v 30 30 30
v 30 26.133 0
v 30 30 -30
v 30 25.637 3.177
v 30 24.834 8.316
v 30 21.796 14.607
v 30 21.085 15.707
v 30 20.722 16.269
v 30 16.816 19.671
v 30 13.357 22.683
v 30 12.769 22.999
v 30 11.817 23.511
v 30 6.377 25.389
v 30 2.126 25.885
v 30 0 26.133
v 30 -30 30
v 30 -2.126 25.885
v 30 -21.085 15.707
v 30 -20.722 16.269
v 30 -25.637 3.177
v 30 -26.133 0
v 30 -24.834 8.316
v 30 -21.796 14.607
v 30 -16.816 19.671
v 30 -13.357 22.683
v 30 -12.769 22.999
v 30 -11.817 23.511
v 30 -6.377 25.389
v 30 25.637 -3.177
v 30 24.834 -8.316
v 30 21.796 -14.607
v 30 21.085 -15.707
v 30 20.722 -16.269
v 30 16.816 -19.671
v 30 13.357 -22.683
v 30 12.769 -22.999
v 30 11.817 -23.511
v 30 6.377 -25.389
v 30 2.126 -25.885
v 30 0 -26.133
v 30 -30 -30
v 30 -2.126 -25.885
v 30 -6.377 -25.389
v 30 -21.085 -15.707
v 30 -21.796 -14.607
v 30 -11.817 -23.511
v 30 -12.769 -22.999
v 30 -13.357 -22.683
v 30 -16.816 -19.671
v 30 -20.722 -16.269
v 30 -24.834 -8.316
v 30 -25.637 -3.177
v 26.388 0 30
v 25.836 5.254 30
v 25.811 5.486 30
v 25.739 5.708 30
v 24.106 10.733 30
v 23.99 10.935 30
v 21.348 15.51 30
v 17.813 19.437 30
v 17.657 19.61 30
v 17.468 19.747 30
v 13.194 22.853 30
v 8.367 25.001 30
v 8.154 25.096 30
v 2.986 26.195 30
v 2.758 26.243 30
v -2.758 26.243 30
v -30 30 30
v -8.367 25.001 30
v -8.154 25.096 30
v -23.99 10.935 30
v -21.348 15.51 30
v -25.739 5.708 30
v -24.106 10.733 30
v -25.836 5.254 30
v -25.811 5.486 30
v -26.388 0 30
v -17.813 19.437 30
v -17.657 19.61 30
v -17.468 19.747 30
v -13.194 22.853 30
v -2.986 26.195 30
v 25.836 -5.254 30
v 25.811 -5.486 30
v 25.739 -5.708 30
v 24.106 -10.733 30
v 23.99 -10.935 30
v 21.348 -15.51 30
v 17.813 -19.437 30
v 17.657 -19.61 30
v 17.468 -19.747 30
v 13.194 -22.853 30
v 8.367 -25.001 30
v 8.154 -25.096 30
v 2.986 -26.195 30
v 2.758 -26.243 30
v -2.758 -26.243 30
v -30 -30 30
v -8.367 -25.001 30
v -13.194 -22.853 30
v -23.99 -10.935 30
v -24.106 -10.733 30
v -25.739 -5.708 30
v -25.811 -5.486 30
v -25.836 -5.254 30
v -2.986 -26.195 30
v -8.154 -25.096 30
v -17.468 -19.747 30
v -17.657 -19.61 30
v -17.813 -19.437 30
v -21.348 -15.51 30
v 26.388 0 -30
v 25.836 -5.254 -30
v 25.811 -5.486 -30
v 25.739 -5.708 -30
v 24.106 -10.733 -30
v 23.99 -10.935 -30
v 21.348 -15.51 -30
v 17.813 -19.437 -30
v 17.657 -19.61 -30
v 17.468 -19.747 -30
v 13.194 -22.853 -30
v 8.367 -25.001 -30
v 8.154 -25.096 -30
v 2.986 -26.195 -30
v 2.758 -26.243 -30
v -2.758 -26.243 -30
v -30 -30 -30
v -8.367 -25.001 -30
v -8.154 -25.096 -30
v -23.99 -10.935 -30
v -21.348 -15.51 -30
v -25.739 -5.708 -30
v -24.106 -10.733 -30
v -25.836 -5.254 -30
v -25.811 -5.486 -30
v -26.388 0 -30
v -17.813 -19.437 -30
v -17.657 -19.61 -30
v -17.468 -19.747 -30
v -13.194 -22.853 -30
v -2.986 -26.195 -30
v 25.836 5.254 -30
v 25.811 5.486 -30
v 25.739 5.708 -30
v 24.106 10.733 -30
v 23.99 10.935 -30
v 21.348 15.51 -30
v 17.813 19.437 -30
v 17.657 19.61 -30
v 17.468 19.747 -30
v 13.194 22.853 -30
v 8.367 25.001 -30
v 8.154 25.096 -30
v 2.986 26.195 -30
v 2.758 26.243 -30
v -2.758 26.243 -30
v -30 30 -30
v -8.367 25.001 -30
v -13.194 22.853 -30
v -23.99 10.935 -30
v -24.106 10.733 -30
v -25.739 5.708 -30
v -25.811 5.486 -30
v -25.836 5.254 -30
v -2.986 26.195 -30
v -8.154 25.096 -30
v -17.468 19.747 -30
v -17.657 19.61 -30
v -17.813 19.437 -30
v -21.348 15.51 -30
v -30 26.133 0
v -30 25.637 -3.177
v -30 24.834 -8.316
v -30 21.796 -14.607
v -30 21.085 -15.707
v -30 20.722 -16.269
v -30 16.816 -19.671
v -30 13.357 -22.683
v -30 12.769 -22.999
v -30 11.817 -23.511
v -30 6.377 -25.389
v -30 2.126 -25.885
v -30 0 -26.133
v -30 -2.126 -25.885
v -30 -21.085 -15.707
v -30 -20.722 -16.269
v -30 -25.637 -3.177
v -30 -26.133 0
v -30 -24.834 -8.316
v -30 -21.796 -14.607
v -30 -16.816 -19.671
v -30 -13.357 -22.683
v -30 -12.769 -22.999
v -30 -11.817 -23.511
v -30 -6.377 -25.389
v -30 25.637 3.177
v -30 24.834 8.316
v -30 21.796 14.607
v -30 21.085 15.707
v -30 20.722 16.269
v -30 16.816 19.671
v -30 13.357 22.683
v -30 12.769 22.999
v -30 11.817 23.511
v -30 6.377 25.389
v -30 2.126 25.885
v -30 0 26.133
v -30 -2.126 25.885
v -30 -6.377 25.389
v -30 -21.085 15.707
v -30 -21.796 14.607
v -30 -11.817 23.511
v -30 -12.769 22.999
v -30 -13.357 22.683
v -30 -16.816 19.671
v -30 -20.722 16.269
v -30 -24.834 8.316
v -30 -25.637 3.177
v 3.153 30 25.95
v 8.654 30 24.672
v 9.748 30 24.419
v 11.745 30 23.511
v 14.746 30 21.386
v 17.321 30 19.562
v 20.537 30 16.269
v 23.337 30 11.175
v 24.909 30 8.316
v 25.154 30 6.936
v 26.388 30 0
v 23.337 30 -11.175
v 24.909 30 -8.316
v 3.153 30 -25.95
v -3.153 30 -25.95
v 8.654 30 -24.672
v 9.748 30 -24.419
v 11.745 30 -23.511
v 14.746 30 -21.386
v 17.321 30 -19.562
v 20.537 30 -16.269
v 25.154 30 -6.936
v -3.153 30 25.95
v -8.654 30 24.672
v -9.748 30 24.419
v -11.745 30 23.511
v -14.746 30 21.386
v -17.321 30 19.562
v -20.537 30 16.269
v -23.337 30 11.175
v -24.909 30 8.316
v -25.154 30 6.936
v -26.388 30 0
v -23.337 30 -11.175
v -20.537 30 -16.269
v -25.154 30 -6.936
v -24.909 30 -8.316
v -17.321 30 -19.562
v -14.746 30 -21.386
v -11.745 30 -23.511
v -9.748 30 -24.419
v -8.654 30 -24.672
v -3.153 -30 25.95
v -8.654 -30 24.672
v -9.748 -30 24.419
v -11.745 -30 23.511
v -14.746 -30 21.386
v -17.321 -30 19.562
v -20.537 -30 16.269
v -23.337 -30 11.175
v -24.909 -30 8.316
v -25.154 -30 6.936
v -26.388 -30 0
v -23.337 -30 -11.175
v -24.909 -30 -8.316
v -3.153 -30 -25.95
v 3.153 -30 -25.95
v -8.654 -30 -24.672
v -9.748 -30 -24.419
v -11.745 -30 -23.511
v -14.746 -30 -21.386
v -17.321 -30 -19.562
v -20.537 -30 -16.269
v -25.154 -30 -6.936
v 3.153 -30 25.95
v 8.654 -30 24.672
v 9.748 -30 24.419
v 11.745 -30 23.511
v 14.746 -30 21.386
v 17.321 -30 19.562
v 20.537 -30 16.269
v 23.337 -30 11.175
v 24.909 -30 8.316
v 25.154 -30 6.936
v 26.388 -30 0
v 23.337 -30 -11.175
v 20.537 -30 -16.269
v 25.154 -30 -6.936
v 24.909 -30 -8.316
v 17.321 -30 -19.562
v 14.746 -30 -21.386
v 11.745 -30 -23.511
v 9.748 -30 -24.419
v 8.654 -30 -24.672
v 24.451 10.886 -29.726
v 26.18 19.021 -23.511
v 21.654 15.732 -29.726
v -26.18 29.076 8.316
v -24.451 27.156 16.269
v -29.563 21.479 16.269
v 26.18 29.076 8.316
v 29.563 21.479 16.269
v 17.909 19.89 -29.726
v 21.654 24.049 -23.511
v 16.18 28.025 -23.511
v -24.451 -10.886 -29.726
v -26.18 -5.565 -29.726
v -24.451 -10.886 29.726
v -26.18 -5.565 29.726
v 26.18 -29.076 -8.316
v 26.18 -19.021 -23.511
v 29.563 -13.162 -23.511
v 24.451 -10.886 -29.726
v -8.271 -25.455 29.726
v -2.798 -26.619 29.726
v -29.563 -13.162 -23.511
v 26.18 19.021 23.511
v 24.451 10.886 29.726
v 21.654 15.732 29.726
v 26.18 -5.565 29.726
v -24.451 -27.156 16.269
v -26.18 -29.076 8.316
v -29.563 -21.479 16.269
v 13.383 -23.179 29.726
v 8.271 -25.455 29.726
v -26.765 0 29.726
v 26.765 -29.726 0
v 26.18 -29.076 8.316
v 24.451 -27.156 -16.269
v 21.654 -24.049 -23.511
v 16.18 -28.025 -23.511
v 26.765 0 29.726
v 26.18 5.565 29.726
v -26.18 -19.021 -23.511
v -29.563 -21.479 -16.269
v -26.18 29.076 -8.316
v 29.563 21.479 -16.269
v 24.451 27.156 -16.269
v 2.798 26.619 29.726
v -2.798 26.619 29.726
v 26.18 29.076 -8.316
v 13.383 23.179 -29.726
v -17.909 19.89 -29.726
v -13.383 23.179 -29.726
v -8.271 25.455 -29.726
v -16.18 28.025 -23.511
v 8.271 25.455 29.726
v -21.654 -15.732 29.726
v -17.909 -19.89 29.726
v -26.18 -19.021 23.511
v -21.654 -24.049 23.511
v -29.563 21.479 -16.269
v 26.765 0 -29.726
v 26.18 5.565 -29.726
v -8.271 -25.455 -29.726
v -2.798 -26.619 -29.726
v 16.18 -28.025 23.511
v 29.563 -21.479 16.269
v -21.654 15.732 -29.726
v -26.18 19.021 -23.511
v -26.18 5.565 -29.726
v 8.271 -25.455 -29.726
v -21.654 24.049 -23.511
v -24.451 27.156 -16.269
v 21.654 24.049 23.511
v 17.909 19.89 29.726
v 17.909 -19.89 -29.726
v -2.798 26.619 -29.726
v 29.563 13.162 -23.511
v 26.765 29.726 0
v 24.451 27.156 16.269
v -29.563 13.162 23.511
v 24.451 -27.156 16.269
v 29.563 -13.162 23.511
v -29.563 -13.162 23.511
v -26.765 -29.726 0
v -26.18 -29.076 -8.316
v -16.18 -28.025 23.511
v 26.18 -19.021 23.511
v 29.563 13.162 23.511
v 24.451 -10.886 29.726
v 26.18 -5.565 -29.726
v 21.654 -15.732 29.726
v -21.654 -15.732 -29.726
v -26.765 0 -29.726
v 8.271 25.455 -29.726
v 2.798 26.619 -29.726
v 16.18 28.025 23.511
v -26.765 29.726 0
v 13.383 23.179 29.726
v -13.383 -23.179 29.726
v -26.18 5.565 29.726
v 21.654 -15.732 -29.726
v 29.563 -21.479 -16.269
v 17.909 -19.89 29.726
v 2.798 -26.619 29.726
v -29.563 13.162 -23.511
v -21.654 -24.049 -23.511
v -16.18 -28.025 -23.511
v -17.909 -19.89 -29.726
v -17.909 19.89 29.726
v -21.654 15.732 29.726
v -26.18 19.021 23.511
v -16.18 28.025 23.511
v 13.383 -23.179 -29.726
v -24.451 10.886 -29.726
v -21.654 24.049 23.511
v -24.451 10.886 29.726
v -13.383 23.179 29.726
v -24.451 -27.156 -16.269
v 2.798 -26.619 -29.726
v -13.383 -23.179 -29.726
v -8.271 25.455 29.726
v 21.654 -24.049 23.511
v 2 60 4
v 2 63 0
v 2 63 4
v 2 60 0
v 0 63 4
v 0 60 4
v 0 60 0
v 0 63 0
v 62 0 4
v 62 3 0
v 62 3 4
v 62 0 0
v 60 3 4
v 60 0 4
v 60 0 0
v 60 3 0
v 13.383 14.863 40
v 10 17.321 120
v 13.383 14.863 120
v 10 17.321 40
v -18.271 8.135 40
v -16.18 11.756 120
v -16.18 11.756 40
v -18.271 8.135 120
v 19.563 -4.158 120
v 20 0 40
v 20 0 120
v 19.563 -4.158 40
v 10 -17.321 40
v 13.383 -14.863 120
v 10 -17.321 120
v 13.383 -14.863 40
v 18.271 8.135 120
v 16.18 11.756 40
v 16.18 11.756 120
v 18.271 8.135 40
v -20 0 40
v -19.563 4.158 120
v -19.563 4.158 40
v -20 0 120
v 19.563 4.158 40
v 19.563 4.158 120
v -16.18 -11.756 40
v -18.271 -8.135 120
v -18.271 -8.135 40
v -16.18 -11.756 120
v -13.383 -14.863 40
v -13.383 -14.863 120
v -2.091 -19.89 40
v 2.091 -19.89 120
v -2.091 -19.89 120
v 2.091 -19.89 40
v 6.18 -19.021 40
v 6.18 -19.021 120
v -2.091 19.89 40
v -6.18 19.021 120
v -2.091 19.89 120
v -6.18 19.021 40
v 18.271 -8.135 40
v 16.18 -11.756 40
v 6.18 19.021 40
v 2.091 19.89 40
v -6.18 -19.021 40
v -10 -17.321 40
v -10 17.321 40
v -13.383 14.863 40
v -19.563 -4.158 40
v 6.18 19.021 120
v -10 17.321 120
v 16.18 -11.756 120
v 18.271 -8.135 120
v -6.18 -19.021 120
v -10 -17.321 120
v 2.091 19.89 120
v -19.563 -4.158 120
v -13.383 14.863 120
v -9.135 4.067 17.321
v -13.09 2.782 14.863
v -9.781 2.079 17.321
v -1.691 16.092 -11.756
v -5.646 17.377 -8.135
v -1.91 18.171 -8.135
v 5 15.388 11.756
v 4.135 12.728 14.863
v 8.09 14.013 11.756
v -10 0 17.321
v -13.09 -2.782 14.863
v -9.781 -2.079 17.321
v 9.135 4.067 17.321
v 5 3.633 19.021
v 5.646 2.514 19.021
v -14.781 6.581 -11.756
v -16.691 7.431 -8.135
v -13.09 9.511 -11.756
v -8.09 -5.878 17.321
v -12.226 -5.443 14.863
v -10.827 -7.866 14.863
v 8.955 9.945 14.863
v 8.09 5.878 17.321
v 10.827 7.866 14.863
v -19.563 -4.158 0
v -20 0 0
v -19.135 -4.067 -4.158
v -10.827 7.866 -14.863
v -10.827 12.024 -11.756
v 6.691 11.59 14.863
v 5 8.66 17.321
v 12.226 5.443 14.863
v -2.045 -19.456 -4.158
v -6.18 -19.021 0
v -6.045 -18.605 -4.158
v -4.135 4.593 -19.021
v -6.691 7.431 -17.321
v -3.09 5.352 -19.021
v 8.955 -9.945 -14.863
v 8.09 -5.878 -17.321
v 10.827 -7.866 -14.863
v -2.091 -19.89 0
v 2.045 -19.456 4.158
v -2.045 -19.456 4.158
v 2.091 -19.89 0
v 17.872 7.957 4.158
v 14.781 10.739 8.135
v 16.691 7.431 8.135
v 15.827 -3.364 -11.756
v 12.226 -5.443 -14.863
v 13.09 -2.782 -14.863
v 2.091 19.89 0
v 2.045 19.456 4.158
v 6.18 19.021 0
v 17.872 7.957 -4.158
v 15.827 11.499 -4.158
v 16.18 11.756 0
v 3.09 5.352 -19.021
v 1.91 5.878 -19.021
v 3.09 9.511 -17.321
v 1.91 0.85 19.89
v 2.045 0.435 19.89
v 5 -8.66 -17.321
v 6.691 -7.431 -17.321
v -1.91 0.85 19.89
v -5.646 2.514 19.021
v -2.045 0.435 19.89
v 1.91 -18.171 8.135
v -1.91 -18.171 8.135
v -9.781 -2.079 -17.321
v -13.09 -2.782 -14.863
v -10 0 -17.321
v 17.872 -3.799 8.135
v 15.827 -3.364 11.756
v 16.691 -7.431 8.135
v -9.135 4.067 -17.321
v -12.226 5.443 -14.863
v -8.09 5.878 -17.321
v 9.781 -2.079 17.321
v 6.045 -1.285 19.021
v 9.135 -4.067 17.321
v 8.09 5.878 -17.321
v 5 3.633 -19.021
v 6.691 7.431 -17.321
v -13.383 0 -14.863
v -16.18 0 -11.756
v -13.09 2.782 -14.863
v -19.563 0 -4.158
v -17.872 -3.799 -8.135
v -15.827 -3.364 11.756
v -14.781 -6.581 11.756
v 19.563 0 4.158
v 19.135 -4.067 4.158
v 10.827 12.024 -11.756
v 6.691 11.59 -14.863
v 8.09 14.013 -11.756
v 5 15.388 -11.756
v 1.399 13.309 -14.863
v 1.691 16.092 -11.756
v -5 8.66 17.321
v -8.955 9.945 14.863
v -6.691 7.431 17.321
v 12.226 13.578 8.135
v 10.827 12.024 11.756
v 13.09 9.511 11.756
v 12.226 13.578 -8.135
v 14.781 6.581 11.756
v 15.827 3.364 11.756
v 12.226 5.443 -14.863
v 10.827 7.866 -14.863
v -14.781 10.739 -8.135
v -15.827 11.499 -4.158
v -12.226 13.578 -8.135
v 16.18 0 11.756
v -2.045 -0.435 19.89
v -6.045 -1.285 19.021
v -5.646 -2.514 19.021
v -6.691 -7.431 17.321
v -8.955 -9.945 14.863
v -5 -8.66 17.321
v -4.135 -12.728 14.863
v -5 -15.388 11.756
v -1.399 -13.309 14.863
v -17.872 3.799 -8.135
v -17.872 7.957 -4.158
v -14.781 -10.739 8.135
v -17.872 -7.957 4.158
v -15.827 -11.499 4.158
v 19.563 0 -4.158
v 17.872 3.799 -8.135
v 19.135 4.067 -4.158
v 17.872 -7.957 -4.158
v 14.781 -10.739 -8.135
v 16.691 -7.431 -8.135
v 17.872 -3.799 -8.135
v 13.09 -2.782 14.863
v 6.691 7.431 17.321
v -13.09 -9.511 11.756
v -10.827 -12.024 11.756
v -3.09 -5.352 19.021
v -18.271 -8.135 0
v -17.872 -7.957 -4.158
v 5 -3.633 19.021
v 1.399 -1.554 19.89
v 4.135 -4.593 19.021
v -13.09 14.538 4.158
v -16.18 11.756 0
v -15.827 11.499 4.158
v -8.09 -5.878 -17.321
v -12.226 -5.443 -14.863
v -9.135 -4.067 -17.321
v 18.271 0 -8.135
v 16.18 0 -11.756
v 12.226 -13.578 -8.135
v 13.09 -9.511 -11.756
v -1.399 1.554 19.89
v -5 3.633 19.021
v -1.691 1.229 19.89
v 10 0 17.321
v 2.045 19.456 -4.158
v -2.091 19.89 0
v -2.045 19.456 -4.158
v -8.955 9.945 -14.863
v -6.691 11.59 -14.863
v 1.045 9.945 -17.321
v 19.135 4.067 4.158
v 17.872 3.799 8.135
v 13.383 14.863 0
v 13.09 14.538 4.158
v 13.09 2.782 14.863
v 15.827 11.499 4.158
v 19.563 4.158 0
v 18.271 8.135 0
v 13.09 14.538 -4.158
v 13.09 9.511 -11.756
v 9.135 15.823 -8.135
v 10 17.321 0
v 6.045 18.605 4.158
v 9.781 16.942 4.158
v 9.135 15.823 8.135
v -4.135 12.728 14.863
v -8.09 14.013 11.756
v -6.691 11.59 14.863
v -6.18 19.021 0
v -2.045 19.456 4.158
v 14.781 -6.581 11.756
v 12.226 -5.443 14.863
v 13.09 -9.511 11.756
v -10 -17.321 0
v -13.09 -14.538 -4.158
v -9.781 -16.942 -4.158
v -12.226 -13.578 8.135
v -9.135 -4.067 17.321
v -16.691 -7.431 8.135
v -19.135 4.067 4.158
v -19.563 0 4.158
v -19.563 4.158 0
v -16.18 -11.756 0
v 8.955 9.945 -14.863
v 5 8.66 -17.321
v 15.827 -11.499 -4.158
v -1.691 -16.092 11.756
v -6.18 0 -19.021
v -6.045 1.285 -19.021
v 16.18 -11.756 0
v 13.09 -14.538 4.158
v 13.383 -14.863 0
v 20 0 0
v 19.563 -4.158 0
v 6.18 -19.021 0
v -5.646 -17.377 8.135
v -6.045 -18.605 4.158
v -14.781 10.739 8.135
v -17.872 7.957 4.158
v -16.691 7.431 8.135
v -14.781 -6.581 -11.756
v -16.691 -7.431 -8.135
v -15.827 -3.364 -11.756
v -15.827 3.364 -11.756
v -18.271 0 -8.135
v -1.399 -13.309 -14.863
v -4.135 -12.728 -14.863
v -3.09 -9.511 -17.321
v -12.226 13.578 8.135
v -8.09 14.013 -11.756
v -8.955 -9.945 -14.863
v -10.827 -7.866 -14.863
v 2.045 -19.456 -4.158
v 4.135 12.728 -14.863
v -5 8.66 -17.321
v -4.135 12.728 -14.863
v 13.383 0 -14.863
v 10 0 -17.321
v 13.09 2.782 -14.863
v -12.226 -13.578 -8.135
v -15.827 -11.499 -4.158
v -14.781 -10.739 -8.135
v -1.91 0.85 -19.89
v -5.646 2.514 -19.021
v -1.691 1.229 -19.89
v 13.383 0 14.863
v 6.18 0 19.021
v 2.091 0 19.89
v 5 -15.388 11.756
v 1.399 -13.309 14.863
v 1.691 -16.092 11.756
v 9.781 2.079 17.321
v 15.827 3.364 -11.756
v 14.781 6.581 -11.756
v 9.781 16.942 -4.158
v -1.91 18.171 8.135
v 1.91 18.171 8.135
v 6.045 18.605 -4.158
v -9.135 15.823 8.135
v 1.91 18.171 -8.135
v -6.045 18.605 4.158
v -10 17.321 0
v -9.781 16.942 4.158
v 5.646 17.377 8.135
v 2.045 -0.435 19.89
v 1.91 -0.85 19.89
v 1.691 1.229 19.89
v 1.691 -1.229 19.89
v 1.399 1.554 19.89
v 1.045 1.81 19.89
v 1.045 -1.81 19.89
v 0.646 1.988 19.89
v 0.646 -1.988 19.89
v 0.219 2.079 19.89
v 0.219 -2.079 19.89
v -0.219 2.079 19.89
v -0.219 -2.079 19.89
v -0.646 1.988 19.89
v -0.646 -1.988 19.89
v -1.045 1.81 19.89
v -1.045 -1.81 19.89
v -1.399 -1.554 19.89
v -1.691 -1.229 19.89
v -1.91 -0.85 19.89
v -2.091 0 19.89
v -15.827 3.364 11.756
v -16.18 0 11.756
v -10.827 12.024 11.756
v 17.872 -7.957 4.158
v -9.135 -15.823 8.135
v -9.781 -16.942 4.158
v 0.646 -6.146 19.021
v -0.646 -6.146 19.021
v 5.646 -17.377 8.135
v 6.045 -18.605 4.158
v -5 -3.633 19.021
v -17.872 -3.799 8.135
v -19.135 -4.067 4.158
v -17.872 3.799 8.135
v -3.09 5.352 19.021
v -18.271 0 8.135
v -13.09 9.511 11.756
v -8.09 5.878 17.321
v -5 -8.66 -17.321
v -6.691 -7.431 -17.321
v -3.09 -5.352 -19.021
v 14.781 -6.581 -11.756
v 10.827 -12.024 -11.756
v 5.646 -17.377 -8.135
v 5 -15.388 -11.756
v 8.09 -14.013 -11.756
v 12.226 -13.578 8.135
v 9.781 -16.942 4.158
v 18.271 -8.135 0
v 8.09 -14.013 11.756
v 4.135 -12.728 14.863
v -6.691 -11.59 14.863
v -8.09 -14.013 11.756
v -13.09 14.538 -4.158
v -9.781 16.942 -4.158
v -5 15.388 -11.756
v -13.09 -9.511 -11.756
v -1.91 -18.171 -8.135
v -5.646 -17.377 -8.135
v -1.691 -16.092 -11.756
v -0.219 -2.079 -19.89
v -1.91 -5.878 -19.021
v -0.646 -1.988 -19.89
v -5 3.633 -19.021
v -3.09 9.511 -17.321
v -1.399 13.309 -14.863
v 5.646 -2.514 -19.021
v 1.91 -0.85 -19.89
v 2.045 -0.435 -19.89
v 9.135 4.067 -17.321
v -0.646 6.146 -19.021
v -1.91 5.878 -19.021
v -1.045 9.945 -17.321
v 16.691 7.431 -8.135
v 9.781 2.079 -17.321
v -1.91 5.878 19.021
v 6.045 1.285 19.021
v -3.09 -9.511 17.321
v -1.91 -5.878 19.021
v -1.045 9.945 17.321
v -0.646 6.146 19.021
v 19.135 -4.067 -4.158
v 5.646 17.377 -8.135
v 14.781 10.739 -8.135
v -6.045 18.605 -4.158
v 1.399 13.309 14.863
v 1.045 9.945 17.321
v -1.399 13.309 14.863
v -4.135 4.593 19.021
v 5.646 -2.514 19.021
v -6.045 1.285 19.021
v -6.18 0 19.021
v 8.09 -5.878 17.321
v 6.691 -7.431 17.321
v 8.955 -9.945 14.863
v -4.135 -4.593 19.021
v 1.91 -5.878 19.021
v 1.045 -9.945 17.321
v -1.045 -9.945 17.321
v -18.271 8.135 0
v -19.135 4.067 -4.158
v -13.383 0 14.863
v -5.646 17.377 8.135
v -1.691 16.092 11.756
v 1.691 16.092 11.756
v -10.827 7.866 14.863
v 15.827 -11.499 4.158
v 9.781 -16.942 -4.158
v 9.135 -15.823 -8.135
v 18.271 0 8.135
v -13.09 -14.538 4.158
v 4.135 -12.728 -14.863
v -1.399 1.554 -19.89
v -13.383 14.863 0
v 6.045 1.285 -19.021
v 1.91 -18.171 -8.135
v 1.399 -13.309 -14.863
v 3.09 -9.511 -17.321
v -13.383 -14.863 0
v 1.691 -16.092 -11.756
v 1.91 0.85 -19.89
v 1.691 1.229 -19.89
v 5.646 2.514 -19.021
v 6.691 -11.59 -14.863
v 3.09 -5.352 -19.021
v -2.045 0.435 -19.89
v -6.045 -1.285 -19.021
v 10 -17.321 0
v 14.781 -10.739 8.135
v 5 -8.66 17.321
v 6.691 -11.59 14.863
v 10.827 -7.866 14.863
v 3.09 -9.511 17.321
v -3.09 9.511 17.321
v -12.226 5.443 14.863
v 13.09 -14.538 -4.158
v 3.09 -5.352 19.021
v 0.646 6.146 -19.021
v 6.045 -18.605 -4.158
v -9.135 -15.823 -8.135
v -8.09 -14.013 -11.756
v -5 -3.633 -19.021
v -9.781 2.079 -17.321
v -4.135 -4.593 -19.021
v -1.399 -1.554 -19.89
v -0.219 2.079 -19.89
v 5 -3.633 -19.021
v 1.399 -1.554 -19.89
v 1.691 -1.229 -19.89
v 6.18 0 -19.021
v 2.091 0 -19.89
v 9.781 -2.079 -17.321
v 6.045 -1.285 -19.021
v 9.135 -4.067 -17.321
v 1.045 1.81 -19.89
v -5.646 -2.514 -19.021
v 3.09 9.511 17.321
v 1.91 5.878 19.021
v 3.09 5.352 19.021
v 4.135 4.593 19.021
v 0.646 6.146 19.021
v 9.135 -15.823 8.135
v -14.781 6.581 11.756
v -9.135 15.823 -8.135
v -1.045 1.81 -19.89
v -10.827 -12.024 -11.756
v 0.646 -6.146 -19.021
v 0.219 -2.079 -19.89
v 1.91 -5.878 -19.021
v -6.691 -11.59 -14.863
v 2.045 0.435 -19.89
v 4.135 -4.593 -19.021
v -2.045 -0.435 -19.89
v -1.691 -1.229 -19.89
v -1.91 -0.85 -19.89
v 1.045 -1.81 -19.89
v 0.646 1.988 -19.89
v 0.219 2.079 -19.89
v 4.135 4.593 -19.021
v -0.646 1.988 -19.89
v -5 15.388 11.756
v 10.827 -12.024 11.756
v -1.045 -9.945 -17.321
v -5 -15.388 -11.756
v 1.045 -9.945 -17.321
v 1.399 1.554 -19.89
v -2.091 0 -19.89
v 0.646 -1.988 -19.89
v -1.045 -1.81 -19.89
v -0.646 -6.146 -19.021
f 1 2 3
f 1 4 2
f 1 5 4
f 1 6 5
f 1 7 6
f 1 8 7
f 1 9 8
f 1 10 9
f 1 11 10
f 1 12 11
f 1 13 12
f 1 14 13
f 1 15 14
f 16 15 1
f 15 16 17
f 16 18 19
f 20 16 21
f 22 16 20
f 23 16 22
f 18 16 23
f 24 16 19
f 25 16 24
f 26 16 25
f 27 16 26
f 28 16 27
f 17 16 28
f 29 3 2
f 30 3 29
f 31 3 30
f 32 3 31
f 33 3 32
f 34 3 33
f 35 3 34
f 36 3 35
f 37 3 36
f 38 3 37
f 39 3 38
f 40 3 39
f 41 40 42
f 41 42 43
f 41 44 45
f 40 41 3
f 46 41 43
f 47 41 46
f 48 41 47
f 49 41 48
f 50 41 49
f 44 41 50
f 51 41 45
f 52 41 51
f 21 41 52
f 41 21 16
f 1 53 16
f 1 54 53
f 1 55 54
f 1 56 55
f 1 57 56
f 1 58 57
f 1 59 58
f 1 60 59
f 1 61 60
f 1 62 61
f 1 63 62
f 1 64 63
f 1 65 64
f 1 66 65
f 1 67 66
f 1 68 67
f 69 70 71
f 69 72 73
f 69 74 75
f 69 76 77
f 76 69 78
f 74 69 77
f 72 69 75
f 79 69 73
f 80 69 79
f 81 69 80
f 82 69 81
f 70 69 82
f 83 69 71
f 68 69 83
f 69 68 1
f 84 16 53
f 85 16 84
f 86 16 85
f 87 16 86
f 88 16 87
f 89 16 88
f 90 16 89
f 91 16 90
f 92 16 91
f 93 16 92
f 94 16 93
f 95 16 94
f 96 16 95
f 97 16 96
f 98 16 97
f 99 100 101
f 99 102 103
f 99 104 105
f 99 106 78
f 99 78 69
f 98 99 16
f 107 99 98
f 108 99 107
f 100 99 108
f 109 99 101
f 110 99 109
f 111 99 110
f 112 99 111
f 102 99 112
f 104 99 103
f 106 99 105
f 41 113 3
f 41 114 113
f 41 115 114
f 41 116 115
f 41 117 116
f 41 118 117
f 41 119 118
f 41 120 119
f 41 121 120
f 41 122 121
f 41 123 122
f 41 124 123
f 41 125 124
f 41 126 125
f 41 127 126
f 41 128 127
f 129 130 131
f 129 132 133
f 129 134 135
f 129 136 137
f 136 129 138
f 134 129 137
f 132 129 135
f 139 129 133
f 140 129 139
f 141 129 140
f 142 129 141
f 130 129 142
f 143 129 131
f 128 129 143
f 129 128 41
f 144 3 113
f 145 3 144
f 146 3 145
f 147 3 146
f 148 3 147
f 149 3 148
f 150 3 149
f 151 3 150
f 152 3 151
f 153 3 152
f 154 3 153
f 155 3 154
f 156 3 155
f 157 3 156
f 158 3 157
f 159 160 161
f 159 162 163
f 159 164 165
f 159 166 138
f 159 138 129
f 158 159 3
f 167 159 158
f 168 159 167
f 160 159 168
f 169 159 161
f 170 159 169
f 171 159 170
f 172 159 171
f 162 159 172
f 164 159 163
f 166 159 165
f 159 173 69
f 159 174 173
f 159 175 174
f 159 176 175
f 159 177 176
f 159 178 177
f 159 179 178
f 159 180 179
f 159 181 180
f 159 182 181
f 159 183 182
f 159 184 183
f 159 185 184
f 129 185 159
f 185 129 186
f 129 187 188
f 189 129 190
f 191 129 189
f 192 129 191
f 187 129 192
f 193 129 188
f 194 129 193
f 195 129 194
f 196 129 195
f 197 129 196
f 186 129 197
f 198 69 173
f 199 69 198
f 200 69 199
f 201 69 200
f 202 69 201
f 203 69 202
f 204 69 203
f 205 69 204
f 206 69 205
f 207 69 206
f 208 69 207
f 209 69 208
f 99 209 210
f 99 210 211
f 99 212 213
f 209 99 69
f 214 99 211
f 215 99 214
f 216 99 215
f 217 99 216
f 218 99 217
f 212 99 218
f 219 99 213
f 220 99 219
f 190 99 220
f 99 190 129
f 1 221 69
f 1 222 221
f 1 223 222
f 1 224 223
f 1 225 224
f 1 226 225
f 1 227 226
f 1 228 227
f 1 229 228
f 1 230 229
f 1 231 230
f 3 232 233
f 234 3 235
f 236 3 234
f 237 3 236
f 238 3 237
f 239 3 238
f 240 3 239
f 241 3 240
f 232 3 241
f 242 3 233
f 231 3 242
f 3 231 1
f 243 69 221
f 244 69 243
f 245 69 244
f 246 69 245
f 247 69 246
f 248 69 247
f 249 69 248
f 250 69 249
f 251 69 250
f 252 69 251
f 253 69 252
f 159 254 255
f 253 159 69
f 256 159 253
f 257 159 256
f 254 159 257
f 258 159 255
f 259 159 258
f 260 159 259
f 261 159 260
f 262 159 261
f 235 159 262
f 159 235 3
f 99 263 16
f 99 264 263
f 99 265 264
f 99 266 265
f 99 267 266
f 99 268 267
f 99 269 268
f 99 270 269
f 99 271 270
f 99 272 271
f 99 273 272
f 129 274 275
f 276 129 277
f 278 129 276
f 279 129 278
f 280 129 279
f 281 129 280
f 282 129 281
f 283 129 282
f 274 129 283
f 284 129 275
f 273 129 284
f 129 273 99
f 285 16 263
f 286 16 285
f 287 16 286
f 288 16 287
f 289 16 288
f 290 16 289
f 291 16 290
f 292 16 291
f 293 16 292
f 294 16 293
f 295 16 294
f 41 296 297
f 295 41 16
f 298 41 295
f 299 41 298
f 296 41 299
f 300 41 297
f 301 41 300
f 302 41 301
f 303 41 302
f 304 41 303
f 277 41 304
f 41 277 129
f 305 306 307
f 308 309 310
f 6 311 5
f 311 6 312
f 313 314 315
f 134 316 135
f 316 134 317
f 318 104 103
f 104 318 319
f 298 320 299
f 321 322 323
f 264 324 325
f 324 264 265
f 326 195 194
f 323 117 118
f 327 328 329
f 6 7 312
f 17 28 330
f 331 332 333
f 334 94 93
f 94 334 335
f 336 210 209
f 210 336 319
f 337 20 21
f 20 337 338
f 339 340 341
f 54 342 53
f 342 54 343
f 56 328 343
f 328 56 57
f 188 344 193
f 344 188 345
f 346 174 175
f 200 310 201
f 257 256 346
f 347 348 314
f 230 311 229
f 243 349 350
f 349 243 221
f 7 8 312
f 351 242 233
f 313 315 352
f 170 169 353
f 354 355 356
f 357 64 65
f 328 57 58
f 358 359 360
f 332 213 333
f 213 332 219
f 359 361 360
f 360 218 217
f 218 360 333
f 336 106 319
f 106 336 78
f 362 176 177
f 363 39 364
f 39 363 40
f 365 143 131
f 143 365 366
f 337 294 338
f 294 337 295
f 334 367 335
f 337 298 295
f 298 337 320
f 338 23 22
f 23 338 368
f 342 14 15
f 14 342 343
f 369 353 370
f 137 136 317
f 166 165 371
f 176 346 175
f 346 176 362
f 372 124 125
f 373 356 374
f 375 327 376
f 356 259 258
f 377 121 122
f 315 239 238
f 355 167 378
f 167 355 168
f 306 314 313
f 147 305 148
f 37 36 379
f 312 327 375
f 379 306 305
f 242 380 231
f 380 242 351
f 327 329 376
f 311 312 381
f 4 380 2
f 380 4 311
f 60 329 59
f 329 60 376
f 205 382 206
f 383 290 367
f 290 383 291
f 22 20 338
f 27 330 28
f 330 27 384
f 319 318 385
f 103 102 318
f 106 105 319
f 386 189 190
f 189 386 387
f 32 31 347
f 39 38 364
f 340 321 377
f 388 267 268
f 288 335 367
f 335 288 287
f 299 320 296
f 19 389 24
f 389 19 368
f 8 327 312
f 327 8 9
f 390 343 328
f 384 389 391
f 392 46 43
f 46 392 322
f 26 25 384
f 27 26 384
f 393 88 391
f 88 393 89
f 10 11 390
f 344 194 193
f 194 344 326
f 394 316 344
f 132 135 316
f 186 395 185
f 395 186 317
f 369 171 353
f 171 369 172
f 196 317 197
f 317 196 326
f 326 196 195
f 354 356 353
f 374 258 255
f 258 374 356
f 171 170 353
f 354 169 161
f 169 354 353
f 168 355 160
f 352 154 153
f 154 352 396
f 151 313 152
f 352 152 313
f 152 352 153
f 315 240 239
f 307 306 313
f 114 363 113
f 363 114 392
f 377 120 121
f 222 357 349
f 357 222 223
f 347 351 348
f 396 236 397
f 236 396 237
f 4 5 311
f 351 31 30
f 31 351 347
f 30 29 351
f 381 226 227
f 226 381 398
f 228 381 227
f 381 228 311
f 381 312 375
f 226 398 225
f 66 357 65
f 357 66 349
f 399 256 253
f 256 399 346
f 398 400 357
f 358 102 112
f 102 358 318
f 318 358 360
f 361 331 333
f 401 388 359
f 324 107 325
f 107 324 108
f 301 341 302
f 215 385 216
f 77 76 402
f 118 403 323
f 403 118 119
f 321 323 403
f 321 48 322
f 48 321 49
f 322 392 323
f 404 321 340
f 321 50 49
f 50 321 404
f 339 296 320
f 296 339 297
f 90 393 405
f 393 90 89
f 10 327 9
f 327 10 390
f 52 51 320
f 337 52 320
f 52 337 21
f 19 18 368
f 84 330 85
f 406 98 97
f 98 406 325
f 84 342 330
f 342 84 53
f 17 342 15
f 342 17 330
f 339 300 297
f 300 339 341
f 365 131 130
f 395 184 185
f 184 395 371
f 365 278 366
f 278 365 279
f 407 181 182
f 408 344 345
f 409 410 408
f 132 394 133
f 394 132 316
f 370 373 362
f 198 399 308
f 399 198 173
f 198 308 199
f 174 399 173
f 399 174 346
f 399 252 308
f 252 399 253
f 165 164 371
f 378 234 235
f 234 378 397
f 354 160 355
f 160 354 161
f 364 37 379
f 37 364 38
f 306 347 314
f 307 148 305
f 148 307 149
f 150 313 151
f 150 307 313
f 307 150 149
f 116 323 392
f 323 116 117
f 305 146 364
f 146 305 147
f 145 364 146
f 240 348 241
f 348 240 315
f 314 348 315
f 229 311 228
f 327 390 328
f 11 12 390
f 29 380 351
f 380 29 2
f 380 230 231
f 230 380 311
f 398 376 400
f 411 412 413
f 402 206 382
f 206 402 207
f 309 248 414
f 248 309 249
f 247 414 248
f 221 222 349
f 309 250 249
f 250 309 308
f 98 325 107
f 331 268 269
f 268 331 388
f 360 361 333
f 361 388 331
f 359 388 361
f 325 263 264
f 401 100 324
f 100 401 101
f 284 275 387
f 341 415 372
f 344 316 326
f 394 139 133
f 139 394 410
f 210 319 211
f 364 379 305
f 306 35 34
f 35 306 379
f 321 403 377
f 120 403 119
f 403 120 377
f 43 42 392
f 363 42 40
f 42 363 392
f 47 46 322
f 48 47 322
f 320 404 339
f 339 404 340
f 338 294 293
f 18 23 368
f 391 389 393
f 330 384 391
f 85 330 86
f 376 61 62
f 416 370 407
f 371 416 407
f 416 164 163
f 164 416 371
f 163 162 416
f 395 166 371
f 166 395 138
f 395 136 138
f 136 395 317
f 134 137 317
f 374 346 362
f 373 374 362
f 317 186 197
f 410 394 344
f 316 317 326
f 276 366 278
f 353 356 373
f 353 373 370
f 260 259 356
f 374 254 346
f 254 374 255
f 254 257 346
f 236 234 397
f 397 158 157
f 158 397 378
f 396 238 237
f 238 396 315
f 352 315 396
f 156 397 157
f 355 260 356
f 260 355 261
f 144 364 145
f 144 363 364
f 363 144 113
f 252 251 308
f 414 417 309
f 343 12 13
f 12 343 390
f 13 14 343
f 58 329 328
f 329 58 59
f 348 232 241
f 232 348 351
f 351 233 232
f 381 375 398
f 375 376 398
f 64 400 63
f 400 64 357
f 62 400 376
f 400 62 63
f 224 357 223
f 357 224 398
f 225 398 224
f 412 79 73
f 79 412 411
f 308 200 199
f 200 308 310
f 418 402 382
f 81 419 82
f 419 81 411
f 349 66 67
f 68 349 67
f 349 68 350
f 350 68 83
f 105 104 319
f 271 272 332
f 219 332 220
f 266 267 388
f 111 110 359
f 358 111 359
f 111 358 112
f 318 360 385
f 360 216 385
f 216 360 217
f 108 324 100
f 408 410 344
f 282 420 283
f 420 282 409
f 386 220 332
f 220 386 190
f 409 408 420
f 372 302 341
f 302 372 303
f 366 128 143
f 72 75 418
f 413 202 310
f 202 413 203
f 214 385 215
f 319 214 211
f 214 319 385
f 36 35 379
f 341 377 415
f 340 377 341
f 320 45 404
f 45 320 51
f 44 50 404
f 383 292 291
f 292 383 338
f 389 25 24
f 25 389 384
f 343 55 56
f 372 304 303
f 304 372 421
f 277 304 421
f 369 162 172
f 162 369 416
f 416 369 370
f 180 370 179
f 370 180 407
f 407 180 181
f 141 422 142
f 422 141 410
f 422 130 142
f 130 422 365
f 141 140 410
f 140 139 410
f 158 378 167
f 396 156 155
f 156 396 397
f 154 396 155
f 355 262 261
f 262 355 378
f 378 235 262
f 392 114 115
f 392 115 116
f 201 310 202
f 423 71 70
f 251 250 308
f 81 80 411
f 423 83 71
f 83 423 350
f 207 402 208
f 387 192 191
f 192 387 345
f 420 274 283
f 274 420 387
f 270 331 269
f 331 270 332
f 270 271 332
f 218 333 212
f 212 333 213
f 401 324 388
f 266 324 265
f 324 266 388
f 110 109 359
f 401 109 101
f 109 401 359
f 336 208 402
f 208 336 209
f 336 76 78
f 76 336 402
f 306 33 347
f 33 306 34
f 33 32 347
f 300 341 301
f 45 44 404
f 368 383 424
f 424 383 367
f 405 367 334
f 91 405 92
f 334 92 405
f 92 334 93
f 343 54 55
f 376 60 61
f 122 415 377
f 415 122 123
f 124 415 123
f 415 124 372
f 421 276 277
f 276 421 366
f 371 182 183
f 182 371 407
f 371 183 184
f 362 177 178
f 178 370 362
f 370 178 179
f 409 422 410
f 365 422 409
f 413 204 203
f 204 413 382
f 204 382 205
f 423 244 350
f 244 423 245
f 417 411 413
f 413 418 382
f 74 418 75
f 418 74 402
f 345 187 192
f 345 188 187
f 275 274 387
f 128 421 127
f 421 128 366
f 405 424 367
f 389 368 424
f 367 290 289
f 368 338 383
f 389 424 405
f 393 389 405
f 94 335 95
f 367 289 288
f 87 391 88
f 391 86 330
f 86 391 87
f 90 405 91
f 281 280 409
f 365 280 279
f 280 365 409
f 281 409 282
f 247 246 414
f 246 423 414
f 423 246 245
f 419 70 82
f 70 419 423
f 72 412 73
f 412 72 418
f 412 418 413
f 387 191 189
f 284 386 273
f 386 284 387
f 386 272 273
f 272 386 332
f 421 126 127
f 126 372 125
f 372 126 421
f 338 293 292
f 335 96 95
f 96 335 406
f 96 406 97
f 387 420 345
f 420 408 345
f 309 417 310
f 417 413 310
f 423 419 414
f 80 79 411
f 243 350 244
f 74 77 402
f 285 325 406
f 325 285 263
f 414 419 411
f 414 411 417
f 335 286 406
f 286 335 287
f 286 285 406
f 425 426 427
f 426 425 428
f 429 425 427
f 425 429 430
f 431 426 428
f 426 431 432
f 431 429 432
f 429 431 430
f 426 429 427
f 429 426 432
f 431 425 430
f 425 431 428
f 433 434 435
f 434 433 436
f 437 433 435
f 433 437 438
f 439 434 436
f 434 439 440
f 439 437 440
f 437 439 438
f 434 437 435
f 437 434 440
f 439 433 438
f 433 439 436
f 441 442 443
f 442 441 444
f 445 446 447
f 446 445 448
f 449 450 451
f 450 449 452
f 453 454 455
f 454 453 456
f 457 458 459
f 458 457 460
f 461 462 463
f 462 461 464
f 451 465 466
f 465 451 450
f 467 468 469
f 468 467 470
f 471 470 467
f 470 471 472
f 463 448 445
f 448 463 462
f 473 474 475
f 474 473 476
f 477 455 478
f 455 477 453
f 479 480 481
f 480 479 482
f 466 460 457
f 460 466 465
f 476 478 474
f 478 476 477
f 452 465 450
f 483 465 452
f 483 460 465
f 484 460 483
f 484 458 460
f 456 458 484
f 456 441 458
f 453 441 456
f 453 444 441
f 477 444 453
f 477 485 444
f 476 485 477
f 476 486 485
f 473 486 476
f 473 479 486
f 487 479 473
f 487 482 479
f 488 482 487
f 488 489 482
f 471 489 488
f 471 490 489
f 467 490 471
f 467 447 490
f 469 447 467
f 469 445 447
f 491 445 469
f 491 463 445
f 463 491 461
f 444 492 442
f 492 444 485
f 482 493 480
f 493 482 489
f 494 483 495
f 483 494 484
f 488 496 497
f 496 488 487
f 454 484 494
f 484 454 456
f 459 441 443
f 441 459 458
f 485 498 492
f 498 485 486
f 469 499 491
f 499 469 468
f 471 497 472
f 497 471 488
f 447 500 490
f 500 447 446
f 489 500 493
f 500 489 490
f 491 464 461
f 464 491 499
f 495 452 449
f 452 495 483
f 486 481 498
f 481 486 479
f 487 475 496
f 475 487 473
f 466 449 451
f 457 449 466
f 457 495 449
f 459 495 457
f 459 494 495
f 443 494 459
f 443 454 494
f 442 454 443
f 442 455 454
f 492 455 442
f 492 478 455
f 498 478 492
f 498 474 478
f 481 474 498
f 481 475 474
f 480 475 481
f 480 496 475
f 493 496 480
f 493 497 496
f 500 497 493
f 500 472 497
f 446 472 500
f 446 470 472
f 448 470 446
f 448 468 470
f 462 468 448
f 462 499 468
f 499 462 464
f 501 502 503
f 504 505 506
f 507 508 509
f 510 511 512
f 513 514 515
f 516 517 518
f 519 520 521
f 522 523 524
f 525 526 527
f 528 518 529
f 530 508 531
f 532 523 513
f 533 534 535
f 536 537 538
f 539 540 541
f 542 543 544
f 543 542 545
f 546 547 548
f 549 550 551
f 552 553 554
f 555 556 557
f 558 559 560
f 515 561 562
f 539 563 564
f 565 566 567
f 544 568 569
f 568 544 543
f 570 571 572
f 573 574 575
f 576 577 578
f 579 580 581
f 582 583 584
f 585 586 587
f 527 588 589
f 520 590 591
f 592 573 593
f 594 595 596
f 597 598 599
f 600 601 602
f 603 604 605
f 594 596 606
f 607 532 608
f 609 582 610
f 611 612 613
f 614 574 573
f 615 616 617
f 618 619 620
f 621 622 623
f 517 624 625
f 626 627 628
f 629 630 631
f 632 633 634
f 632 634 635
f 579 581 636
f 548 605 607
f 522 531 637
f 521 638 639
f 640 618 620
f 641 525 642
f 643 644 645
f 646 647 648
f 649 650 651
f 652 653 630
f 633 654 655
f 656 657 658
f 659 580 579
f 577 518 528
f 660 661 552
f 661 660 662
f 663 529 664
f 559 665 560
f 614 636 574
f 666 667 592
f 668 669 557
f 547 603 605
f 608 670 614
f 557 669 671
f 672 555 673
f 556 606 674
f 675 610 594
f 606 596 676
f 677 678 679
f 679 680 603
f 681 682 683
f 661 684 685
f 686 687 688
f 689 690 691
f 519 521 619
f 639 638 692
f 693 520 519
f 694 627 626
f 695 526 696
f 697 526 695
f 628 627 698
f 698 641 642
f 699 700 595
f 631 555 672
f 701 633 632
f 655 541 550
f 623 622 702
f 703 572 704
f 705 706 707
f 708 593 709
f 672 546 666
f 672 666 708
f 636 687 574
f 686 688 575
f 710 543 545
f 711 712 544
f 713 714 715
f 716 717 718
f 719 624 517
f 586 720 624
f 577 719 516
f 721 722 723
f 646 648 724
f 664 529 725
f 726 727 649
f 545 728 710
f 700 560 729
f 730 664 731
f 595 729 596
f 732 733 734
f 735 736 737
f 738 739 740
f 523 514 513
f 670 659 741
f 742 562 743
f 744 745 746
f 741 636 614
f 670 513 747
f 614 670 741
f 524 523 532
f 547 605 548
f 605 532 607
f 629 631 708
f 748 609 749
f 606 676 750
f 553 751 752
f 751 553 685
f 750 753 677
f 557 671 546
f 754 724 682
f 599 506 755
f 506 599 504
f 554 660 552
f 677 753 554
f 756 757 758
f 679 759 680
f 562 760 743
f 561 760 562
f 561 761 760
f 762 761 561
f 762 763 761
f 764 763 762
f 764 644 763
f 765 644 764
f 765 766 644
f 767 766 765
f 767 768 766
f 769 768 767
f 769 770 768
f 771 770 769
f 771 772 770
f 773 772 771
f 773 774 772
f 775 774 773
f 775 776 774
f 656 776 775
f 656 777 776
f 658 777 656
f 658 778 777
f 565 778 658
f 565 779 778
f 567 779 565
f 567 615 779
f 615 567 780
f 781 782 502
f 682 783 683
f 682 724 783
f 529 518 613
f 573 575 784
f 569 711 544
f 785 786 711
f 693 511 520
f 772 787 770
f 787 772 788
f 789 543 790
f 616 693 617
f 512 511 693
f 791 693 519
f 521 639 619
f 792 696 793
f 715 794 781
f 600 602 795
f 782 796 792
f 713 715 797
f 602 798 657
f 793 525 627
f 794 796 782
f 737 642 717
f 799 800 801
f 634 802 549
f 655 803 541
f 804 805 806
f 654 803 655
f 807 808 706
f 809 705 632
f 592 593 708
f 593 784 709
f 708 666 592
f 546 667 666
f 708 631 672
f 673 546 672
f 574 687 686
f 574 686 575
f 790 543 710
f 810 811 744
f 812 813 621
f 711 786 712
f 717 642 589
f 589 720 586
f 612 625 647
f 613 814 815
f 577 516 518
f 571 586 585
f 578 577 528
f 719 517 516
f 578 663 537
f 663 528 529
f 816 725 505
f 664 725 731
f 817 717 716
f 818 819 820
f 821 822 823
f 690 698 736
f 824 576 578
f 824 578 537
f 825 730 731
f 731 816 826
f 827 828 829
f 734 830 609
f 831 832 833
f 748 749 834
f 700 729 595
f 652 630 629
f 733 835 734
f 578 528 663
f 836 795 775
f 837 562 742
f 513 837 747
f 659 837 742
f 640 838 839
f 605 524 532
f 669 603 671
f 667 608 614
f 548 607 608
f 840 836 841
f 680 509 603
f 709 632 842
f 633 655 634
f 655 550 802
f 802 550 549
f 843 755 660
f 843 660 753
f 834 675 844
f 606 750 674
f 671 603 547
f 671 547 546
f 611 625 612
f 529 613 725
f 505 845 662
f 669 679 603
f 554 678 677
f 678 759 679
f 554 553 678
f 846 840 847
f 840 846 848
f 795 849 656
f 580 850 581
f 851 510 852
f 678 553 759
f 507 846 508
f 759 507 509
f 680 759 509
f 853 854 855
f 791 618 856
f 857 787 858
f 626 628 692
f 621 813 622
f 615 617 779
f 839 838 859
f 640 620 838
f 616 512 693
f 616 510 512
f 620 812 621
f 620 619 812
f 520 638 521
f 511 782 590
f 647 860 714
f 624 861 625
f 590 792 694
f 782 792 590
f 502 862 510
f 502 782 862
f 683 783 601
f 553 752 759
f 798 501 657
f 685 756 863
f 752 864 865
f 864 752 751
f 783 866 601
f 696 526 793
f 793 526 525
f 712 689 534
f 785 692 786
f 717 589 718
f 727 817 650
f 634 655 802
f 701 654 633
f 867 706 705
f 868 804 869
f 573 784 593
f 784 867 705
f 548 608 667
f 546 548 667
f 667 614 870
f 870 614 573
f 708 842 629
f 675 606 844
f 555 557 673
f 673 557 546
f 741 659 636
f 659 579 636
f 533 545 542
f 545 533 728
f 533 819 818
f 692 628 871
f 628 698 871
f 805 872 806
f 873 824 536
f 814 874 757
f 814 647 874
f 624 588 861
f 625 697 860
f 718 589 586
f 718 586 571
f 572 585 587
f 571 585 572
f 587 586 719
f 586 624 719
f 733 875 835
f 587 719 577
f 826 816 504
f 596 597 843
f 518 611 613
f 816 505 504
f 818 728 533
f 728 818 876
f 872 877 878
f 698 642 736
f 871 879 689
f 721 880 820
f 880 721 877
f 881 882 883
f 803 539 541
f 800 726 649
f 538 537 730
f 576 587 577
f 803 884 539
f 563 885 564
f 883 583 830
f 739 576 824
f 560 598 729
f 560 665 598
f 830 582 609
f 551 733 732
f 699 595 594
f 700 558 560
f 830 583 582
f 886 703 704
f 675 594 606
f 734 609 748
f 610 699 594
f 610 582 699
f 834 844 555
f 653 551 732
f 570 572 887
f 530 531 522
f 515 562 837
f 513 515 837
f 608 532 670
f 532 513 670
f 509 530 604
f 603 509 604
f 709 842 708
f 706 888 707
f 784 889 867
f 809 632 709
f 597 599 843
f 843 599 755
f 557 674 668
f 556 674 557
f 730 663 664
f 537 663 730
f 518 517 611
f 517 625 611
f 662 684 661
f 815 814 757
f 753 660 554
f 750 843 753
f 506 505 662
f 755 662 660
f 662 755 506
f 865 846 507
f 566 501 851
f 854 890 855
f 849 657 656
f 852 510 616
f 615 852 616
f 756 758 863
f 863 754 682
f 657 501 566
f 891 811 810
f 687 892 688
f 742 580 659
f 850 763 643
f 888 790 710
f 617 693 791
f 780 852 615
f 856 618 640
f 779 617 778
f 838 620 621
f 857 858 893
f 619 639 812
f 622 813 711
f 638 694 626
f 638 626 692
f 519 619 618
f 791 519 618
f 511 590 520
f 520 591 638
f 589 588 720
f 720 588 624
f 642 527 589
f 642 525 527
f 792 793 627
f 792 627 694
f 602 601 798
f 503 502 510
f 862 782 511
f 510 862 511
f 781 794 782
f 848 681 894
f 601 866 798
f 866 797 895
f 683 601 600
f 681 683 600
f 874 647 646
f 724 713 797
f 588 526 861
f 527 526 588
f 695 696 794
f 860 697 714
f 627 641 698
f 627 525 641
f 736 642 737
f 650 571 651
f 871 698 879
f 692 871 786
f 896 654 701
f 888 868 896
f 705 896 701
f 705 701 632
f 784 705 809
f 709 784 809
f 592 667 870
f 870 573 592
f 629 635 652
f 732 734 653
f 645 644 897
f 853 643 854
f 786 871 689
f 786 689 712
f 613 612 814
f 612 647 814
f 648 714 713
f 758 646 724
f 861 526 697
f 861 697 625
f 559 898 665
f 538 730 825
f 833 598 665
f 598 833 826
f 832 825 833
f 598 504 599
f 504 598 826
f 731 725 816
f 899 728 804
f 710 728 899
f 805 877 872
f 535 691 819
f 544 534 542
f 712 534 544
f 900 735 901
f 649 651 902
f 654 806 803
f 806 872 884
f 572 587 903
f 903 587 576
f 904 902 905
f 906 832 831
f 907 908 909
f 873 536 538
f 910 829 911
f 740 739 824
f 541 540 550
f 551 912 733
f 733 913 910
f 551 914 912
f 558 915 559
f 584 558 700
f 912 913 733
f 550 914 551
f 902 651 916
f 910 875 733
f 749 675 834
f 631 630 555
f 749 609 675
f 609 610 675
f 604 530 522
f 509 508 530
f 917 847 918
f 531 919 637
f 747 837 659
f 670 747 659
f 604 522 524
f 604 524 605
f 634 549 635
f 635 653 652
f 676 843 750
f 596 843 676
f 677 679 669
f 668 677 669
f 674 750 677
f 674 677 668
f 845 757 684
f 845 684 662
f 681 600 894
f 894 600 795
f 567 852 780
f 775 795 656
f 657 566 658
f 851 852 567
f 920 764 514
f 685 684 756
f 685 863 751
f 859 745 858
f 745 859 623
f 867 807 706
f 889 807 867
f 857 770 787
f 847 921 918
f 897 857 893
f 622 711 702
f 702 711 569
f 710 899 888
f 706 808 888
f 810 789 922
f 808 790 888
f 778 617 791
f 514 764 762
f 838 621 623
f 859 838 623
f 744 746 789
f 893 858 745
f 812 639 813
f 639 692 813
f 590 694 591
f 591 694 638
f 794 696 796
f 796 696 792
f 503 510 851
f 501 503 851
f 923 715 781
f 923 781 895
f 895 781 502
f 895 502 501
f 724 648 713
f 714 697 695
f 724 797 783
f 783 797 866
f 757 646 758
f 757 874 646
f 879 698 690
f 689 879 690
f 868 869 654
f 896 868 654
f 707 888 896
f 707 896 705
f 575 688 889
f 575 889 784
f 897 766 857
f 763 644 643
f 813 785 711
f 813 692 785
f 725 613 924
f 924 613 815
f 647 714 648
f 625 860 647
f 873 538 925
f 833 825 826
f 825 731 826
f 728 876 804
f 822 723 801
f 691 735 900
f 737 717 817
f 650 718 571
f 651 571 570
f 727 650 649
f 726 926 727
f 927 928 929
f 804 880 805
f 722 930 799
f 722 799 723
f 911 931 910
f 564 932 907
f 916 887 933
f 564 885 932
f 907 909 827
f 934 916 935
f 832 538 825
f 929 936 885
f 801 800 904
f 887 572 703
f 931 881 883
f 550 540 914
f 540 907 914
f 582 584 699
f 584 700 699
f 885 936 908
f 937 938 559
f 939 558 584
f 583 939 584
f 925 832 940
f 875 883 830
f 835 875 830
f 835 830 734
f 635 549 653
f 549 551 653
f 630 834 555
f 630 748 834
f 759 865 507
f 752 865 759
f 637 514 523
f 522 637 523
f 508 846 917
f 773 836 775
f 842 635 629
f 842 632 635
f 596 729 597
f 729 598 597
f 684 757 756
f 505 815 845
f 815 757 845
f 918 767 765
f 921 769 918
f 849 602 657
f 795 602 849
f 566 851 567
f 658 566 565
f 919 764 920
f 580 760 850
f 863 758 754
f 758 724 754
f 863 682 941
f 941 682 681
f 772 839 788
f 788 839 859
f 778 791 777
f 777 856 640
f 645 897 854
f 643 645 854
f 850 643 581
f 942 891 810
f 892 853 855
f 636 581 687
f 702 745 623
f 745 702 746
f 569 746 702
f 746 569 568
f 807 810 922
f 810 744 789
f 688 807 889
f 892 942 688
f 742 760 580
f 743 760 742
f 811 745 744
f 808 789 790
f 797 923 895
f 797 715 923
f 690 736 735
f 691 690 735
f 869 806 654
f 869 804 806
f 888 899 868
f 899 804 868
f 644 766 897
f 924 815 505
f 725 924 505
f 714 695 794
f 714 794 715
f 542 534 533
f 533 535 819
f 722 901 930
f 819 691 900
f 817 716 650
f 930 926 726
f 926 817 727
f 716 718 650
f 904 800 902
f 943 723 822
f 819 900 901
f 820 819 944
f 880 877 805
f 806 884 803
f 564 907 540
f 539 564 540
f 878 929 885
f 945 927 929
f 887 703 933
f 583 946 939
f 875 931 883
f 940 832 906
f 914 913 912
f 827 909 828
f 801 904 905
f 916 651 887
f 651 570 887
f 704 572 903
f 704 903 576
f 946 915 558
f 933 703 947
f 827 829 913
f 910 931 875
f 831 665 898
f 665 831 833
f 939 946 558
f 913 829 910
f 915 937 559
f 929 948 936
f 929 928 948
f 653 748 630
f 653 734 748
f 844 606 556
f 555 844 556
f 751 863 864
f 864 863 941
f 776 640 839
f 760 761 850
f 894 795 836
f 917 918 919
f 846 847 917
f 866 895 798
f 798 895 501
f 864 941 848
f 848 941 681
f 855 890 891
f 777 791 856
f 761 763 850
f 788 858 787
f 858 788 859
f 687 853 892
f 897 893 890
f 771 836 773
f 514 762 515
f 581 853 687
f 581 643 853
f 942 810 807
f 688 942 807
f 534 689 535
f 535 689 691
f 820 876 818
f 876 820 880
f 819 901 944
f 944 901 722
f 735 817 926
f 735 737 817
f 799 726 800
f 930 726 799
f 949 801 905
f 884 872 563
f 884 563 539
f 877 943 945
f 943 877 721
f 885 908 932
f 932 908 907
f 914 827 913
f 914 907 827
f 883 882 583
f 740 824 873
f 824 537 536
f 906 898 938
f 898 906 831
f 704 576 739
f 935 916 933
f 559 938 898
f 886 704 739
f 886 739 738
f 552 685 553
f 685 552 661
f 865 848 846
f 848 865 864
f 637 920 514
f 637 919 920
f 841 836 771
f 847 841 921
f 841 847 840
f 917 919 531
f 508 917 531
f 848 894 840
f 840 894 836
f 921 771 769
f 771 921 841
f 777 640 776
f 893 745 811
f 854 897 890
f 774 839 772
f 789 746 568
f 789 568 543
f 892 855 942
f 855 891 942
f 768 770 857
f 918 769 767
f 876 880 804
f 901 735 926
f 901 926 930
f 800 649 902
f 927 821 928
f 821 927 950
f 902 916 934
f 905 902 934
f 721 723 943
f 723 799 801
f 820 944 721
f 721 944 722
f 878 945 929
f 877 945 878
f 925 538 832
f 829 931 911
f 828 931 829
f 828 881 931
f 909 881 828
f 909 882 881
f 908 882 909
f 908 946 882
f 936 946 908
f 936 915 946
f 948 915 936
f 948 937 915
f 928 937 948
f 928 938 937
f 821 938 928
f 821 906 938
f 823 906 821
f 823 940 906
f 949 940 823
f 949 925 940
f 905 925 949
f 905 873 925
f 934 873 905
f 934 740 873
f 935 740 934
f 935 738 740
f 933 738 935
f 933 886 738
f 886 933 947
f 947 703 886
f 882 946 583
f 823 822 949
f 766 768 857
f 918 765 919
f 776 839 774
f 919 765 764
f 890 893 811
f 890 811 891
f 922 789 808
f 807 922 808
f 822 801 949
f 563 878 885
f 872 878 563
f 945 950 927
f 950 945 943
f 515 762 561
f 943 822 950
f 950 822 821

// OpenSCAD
size = 20;
cubesize = 3 * size;
cutsphere = 2 * size;
innersphere = size;
cylinderheight = 4 * size;
cylinderradius = size;
cylinderoffset = 2 * size;
 

//create a cyan rectangle @y+35
translate([0, cubesize, 0])
color([0, 1, 1])
cube([2, 3, 4]);

// create a red rectangle at x+35
translate([cubesize, 0, 0]) {
    color([1,0,0])
    cube([2, 3, 4]);
}

// create a green 30x30x30 cube at the center with a r20 sphere cut out
difference() {
    color([0,1,0])
    cube(cubesize, center=true);
    sphere(cutsphere);
}

// create a h40 r10 cylinder at z+30
translate([0, 0, cylinderoffset]) {
    cylinder(h=cylinderheight, r=cylinderradius);
}

// create a r10 sphere at the center
sphere(innersphere);
